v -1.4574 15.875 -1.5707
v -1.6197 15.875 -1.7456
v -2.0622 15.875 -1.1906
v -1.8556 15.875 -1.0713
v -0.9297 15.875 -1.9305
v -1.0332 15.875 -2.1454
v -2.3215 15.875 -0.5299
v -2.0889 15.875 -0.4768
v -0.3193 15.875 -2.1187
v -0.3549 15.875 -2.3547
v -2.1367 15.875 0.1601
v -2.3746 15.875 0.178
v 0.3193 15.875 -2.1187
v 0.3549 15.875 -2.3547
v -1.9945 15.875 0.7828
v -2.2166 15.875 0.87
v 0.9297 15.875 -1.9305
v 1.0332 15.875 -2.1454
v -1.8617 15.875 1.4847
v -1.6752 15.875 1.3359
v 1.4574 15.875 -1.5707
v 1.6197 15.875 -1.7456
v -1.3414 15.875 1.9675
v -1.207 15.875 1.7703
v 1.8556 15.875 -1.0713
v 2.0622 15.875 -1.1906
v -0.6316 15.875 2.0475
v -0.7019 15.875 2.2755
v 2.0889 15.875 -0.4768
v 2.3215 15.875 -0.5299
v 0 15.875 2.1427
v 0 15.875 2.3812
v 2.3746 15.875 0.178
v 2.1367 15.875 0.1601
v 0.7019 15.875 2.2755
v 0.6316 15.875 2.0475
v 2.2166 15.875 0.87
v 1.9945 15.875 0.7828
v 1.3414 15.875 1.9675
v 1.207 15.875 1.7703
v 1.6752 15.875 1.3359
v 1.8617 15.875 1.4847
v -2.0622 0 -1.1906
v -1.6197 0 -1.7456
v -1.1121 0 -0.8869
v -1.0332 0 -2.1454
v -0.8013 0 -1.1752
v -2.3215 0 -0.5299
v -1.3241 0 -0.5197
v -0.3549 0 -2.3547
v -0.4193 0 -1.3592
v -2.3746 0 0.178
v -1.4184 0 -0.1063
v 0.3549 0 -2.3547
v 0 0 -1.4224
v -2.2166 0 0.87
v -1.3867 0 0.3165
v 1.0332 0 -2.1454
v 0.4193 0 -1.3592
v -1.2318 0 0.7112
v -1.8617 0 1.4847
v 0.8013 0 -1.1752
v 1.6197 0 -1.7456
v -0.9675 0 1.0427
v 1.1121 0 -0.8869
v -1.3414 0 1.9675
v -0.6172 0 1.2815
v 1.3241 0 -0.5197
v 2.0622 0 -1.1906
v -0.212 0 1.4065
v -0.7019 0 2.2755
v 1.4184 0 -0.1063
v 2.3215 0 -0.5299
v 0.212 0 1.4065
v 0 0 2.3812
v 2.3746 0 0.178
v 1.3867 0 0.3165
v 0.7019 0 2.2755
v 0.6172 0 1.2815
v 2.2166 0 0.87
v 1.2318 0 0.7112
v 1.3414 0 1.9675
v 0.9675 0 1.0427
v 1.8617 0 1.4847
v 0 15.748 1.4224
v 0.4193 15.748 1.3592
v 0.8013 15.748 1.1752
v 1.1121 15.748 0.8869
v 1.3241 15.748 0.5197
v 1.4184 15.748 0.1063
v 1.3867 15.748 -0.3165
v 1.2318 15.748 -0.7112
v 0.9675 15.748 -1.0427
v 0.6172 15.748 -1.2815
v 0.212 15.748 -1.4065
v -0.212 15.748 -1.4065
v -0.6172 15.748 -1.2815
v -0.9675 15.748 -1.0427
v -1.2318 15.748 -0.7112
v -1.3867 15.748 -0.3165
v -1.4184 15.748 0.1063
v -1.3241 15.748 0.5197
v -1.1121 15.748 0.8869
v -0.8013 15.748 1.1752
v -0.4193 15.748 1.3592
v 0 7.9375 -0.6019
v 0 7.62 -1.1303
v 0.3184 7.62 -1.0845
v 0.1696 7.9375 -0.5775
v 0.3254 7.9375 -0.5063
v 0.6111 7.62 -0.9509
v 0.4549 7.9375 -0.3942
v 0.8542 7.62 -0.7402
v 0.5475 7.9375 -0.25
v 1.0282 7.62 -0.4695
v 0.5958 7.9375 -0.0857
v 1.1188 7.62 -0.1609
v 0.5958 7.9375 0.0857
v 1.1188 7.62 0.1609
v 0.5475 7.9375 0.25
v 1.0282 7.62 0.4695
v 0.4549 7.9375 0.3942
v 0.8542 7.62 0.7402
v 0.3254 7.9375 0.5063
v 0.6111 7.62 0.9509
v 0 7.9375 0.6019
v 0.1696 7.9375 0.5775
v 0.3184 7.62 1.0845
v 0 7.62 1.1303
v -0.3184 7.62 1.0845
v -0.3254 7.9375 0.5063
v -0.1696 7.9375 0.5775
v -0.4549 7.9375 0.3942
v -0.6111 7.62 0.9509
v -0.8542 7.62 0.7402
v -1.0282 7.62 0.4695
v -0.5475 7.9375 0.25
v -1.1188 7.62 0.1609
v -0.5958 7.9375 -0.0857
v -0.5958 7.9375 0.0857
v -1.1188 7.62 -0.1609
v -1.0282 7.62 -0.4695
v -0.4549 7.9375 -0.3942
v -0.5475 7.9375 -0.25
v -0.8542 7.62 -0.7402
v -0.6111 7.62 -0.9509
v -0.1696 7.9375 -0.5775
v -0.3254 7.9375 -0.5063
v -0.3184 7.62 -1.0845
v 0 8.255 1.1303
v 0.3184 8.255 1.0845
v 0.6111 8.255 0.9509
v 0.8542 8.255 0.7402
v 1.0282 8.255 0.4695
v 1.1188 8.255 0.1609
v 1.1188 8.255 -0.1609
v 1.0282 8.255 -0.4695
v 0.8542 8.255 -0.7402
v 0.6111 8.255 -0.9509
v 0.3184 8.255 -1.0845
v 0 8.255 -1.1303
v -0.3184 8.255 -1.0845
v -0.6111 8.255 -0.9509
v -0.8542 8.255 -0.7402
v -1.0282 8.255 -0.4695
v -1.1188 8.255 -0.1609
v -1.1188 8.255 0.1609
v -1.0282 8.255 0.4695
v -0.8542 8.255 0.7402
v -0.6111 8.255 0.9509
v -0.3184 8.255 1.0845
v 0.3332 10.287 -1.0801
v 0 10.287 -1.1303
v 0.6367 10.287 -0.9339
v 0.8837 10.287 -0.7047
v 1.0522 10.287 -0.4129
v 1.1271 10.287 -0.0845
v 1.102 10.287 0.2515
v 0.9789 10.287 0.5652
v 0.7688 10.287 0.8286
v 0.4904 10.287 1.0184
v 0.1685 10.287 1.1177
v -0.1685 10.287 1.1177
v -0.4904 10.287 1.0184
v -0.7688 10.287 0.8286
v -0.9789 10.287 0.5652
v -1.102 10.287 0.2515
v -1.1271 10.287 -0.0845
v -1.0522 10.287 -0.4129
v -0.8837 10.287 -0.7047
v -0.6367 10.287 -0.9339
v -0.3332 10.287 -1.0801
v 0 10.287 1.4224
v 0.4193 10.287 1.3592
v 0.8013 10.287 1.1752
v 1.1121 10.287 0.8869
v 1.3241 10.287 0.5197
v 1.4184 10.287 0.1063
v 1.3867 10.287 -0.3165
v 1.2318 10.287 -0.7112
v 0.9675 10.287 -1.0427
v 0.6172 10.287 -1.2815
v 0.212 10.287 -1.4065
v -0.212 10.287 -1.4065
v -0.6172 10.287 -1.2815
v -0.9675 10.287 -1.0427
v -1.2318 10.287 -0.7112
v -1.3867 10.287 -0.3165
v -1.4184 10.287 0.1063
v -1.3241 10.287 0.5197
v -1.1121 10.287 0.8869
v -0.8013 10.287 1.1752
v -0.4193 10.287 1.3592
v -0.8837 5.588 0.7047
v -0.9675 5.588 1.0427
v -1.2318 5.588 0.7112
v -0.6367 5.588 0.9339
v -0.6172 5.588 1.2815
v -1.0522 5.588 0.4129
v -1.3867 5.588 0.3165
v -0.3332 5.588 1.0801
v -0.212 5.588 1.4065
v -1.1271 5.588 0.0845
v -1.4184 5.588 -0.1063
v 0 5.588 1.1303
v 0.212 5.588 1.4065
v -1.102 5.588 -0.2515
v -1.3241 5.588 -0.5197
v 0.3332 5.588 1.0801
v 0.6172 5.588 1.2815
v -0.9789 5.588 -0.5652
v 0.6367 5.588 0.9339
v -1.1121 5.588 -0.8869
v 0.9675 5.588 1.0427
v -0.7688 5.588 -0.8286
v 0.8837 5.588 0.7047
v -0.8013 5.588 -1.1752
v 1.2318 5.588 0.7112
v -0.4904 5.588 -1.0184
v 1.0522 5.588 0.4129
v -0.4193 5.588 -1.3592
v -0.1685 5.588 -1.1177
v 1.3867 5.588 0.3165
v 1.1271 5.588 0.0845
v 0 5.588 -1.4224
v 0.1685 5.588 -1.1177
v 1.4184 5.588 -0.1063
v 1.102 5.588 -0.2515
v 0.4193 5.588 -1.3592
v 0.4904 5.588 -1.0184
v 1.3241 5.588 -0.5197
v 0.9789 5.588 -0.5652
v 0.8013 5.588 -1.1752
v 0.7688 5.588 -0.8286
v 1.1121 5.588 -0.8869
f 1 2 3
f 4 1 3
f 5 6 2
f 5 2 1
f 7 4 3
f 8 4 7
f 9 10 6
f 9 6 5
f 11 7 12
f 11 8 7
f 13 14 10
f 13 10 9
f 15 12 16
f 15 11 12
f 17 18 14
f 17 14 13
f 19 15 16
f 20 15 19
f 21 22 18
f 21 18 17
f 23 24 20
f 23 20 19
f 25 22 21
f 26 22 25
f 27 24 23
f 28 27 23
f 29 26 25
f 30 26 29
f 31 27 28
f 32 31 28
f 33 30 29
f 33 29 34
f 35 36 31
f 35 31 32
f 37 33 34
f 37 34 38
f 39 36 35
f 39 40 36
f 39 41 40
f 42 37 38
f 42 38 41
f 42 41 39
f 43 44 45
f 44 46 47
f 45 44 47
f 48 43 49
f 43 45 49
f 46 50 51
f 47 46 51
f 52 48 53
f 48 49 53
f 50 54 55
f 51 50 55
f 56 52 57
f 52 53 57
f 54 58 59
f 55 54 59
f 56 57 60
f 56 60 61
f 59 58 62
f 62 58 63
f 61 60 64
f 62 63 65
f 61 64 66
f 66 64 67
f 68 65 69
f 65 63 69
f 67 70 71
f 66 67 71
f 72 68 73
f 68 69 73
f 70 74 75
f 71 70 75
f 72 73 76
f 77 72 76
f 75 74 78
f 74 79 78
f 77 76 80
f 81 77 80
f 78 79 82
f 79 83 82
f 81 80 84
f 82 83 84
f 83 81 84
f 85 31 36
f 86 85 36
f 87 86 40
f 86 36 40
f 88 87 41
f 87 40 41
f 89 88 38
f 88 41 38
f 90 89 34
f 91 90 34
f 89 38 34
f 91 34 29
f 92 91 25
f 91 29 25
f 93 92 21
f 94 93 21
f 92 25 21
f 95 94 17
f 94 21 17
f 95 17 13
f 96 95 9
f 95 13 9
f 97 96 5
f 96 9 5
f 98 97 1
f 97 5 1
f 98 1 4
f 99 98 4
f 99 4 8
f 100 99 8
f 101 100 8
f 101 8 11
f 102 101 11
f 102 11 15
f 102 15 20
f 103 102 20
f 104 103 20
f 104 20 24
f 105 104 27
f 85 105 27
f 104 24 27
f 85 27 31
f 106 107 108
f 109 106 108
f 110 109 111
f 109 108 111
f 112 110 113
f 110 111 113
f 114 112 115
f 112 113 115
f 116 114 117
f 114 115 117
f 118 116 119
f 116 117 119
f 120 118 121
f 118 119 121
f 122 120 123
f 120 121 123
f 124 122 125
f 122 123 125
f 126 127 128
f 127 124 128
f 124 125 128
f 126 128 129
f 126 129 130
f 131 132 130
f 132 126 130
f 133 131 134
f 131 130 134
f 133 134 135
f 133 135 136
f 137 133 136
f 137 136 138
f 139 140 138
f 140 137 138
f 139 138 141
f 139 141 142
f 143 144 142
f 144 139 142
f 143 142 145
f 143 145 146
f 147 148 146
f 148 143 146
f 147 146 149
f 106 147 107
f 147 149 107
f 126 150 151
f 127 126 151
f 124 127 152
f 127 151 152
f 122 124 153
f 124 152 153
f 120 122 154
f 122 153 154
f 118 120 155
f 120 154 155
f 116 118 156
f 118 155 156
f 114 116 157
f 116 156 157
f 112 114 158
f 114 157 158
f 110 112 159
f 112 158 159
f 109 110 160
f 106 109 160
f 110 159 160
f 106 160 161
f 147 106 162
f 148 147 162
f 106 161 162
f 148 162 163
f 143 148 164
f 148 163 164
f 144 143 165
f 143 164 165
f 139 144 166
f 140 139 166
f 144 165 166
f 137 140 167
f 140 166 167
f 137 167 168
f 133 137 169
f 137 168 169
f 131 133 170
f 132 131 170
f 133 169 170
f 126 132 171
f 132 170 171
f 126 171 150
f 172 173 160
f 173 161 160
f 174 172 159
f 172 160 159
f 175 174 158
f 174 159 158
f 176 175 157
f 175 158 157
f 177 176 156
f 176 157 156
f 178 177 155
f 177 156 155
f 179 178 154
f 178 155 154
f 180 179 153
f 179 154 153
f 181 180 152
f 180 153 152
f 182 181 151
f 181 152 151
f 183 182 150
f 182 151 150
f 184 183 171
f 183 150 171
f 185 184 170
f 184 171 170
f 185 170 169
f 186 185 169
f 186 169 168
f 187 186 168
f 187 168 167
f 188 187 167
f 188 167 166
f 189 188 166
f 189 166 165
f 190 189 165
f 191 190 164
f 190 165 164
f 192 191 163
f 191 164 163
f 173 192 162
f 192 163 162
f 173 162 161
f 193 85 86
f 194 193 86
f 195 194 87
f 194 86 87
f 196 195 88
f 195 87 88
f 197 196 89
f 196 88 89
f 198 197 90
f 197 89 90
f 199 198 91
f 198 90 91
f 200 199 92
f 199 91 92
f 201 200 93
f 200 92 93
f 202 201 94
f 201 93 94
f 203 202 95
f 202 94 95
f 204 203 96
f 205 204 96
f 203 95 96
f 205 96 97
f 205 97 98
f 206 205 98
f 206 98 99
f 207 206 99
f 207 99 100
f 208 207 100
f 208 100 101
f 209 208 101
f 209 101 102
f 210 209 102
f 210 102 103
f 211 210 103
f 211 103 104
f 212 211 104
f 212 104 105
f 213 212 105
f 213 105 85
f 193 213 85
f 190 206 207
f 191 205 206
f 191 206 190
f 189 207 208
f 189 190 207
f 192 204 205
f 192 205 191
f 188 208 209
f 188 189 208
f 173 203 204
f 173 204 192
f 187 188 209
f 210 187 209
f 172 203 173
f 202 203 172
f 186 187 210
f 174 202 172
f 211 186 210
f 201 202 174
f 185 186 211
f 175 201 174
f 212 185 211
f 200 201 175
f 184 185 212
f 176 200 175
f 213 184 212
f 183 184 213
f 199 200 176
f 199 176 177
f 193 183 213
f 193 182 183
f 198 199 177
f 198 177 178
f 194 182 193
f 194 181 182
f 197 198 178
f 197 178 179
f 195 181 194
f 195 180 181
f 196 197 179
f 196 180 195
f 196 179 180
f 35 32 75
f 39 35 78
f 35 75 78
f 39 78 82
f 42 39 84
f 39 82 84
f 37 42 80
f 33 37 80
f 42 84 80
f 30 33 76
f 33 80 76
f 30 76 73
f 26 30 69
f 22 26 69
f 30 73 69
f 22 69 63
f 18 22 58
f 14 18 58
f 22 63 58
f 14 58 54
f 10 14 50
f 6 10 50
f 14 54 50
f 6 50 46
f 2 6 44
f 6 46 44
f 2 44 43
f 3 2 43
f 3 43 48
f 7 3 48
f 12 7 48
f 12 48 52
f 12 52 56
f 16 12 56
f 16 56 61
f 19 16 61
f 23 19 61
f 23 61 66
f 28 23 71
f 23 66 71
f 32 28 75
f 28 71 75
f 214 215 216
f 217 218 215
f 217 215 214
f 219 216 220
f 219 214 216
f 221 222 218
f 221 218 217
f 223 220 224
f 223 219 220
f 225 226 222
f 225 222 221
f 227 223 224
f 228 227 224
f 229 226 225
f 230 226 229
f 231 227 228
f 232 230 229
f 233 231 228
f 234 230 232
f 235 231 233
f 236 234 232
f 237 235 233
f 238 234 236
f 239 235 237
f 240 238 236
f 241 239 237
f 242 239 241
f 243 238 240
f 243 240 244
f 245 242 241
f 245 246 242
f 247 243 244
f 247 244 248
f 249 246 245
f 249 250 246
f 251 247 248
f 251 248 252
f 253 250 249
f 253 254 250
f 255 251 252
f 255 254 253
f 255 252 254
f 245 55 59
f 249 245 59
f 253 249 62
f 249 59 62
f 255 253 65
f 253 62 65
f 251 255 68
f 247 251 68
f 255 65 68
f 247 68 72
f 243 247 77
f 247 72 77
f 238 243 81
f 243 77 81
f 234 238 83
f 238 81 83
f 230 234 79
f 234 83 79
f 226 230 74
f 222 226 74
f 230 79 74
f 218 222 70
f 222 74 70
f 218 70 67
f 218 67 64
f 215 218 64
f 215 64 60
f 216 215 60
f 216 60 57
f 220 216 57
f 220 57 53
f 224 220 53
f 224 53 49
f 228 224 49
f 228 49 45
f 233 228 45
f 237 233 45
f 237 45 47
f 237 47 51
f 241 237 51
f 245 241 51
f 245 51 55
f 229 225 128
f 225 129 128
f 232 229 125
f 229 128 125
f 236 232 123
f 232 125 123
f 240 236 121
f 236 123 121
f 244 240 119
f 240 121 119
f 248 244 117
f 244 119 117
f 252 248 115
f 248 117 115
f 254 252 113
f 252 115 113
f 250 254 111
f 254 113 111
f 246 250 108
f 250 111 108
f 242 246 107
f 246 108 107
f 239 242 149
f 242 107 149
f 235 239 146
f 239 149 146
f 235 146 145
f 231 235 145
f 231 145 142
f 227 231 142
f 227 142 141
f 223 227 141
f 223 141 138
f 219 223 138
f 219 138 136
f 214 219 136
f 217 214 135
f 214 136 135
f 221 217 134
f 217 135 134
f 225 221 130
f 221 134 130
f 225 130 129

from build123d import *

# Parameters (mm, degrees)
SKETCH1_R                                 = 2.38125
EXTRUDE1_DEPTH                            = 15.875
F_4_40_TAPPED_HOLE1_D                     = 2.2606
F_4_40_TAPPED_HOLE1_DEPTH                 = 7.62
F_4_40_TAPPED_HOLE1_CBORE_D               = 2.8448
F_4_40_TAPPED_HOLE1_CBORE_DEPTH           = 5.588
F_4_40_TAPPED_HOLE1_TIP                   = 0.679152758
F_4_40_TAPPED_HOLE1_ON_FACE_2_D           = 2.2606
F_4_40_TAPPED_HOLE1_ON_FACE_2_DEPTH       = 7.62
F_4_40_TAPPED_HOLE1_ON_FACE_2_CBORE_D     = 2.8448
F_4_40_TAPPED_HOLE1_ON_FACE_2_CBORE_DEPTH = 5.588
F_4_40_TAPPED_HOLE1_ON_FACE_2_TIP         = 0.679152758
CHAMFER1_SIZE                             = 0.127
CHAMFER1_SIZE2                            = 0.720252791


with BuildPart() as part:
    # Sketch1 → Extrude1 (new body)
    with BuildSketch(Plane(origin=(0, 0, 0), x_dir=(1, 0, 0), z_dir=(0, 1, 0))):
        with Locations(Location((0, 0, 0), (0, 0, 270))):  # turned: the seam where the file's is
            Circle(SKETCH1_R)
    extrude(amount=EXTRUDE1_DEPTH)

    # #4-40 Tapped Hole1
    with Locations(Plane.ZX.offset(15.875)):
        with Locations((0, 0)):
            CounterBoreHole(F_4_40_TAPPED_HOLE1_D / 2, F_4_40_TAPPED_HOLE1_CBORE_D / 2, F_4_40_TAPPED_HOLE1_CBORE_DEPTH, depth=F_4_40_TAPPED_HOLE1_DEPTH)
            with Locations((0, 0, -(F_4_40_TAPPED_HOLE1_DEPTH + F_4_40_TAPPED_HOLE1_TIP / 2))):  # 118° drill point
                Cone(0, F_4_40_TAPPED_HOLE1_D / 2, F_4_40_TAPPED_HOLE1_TIP, mode=Mode.SUBTRACT)

    # #4-40 Tapped Hole1 on face 2
    with Locations(Plane(origin=(0, 0, 0), x_dir=(0, 0, -1), z_dir=(0, -1, 0))):
        with Locations((0, 0)):
            CounterBoreHole(F_4_40_TAPPED_HOLE1_ON_FACE_2_D / 2, F_4_40_TAPPED_HOLE1_ON_FACE_2_CBORE_D / 2, F_4_40_TAPPED_HOLE1_ON_FACE_2_CBORE_DEPTH, depth=F_4_40_TAPPED_HOLE1_ON_FACE_2_DEPTH)
            with Locations((0, 0, -(F_4_40_TAPPED_HOLE1_ON_FACE_2_DEPTH + F_4_40_TAPPED_HOLE1_ON_FACE_2_TIP / 2))):  # 118° drill point
                Cone(0, F_4_40_TAPPED_HOLE1_ON_FACE_2_D / 2, F_4_40_TAPPED_HOLE1_ON_FACE_2_TIP, mode=Mode.SUBTRACT)

    # Chamfer1
    chamfer1_edges = [part.edges().sort_by_distance(p)[0] for p in [
        (0, 15.875, -1.4224),
    ]]
    chamfer1_side = [part.faces().sort_by_distance(p)[0] for p in [
        (0, 13.081, -1.4224),
    ]]
    chamfer(chamfer1_edges, length=CHAMFER1_SIZE, length2=CHAMFER1_SIZE2, reference=chamfer1_side[0])


solid = part.part
